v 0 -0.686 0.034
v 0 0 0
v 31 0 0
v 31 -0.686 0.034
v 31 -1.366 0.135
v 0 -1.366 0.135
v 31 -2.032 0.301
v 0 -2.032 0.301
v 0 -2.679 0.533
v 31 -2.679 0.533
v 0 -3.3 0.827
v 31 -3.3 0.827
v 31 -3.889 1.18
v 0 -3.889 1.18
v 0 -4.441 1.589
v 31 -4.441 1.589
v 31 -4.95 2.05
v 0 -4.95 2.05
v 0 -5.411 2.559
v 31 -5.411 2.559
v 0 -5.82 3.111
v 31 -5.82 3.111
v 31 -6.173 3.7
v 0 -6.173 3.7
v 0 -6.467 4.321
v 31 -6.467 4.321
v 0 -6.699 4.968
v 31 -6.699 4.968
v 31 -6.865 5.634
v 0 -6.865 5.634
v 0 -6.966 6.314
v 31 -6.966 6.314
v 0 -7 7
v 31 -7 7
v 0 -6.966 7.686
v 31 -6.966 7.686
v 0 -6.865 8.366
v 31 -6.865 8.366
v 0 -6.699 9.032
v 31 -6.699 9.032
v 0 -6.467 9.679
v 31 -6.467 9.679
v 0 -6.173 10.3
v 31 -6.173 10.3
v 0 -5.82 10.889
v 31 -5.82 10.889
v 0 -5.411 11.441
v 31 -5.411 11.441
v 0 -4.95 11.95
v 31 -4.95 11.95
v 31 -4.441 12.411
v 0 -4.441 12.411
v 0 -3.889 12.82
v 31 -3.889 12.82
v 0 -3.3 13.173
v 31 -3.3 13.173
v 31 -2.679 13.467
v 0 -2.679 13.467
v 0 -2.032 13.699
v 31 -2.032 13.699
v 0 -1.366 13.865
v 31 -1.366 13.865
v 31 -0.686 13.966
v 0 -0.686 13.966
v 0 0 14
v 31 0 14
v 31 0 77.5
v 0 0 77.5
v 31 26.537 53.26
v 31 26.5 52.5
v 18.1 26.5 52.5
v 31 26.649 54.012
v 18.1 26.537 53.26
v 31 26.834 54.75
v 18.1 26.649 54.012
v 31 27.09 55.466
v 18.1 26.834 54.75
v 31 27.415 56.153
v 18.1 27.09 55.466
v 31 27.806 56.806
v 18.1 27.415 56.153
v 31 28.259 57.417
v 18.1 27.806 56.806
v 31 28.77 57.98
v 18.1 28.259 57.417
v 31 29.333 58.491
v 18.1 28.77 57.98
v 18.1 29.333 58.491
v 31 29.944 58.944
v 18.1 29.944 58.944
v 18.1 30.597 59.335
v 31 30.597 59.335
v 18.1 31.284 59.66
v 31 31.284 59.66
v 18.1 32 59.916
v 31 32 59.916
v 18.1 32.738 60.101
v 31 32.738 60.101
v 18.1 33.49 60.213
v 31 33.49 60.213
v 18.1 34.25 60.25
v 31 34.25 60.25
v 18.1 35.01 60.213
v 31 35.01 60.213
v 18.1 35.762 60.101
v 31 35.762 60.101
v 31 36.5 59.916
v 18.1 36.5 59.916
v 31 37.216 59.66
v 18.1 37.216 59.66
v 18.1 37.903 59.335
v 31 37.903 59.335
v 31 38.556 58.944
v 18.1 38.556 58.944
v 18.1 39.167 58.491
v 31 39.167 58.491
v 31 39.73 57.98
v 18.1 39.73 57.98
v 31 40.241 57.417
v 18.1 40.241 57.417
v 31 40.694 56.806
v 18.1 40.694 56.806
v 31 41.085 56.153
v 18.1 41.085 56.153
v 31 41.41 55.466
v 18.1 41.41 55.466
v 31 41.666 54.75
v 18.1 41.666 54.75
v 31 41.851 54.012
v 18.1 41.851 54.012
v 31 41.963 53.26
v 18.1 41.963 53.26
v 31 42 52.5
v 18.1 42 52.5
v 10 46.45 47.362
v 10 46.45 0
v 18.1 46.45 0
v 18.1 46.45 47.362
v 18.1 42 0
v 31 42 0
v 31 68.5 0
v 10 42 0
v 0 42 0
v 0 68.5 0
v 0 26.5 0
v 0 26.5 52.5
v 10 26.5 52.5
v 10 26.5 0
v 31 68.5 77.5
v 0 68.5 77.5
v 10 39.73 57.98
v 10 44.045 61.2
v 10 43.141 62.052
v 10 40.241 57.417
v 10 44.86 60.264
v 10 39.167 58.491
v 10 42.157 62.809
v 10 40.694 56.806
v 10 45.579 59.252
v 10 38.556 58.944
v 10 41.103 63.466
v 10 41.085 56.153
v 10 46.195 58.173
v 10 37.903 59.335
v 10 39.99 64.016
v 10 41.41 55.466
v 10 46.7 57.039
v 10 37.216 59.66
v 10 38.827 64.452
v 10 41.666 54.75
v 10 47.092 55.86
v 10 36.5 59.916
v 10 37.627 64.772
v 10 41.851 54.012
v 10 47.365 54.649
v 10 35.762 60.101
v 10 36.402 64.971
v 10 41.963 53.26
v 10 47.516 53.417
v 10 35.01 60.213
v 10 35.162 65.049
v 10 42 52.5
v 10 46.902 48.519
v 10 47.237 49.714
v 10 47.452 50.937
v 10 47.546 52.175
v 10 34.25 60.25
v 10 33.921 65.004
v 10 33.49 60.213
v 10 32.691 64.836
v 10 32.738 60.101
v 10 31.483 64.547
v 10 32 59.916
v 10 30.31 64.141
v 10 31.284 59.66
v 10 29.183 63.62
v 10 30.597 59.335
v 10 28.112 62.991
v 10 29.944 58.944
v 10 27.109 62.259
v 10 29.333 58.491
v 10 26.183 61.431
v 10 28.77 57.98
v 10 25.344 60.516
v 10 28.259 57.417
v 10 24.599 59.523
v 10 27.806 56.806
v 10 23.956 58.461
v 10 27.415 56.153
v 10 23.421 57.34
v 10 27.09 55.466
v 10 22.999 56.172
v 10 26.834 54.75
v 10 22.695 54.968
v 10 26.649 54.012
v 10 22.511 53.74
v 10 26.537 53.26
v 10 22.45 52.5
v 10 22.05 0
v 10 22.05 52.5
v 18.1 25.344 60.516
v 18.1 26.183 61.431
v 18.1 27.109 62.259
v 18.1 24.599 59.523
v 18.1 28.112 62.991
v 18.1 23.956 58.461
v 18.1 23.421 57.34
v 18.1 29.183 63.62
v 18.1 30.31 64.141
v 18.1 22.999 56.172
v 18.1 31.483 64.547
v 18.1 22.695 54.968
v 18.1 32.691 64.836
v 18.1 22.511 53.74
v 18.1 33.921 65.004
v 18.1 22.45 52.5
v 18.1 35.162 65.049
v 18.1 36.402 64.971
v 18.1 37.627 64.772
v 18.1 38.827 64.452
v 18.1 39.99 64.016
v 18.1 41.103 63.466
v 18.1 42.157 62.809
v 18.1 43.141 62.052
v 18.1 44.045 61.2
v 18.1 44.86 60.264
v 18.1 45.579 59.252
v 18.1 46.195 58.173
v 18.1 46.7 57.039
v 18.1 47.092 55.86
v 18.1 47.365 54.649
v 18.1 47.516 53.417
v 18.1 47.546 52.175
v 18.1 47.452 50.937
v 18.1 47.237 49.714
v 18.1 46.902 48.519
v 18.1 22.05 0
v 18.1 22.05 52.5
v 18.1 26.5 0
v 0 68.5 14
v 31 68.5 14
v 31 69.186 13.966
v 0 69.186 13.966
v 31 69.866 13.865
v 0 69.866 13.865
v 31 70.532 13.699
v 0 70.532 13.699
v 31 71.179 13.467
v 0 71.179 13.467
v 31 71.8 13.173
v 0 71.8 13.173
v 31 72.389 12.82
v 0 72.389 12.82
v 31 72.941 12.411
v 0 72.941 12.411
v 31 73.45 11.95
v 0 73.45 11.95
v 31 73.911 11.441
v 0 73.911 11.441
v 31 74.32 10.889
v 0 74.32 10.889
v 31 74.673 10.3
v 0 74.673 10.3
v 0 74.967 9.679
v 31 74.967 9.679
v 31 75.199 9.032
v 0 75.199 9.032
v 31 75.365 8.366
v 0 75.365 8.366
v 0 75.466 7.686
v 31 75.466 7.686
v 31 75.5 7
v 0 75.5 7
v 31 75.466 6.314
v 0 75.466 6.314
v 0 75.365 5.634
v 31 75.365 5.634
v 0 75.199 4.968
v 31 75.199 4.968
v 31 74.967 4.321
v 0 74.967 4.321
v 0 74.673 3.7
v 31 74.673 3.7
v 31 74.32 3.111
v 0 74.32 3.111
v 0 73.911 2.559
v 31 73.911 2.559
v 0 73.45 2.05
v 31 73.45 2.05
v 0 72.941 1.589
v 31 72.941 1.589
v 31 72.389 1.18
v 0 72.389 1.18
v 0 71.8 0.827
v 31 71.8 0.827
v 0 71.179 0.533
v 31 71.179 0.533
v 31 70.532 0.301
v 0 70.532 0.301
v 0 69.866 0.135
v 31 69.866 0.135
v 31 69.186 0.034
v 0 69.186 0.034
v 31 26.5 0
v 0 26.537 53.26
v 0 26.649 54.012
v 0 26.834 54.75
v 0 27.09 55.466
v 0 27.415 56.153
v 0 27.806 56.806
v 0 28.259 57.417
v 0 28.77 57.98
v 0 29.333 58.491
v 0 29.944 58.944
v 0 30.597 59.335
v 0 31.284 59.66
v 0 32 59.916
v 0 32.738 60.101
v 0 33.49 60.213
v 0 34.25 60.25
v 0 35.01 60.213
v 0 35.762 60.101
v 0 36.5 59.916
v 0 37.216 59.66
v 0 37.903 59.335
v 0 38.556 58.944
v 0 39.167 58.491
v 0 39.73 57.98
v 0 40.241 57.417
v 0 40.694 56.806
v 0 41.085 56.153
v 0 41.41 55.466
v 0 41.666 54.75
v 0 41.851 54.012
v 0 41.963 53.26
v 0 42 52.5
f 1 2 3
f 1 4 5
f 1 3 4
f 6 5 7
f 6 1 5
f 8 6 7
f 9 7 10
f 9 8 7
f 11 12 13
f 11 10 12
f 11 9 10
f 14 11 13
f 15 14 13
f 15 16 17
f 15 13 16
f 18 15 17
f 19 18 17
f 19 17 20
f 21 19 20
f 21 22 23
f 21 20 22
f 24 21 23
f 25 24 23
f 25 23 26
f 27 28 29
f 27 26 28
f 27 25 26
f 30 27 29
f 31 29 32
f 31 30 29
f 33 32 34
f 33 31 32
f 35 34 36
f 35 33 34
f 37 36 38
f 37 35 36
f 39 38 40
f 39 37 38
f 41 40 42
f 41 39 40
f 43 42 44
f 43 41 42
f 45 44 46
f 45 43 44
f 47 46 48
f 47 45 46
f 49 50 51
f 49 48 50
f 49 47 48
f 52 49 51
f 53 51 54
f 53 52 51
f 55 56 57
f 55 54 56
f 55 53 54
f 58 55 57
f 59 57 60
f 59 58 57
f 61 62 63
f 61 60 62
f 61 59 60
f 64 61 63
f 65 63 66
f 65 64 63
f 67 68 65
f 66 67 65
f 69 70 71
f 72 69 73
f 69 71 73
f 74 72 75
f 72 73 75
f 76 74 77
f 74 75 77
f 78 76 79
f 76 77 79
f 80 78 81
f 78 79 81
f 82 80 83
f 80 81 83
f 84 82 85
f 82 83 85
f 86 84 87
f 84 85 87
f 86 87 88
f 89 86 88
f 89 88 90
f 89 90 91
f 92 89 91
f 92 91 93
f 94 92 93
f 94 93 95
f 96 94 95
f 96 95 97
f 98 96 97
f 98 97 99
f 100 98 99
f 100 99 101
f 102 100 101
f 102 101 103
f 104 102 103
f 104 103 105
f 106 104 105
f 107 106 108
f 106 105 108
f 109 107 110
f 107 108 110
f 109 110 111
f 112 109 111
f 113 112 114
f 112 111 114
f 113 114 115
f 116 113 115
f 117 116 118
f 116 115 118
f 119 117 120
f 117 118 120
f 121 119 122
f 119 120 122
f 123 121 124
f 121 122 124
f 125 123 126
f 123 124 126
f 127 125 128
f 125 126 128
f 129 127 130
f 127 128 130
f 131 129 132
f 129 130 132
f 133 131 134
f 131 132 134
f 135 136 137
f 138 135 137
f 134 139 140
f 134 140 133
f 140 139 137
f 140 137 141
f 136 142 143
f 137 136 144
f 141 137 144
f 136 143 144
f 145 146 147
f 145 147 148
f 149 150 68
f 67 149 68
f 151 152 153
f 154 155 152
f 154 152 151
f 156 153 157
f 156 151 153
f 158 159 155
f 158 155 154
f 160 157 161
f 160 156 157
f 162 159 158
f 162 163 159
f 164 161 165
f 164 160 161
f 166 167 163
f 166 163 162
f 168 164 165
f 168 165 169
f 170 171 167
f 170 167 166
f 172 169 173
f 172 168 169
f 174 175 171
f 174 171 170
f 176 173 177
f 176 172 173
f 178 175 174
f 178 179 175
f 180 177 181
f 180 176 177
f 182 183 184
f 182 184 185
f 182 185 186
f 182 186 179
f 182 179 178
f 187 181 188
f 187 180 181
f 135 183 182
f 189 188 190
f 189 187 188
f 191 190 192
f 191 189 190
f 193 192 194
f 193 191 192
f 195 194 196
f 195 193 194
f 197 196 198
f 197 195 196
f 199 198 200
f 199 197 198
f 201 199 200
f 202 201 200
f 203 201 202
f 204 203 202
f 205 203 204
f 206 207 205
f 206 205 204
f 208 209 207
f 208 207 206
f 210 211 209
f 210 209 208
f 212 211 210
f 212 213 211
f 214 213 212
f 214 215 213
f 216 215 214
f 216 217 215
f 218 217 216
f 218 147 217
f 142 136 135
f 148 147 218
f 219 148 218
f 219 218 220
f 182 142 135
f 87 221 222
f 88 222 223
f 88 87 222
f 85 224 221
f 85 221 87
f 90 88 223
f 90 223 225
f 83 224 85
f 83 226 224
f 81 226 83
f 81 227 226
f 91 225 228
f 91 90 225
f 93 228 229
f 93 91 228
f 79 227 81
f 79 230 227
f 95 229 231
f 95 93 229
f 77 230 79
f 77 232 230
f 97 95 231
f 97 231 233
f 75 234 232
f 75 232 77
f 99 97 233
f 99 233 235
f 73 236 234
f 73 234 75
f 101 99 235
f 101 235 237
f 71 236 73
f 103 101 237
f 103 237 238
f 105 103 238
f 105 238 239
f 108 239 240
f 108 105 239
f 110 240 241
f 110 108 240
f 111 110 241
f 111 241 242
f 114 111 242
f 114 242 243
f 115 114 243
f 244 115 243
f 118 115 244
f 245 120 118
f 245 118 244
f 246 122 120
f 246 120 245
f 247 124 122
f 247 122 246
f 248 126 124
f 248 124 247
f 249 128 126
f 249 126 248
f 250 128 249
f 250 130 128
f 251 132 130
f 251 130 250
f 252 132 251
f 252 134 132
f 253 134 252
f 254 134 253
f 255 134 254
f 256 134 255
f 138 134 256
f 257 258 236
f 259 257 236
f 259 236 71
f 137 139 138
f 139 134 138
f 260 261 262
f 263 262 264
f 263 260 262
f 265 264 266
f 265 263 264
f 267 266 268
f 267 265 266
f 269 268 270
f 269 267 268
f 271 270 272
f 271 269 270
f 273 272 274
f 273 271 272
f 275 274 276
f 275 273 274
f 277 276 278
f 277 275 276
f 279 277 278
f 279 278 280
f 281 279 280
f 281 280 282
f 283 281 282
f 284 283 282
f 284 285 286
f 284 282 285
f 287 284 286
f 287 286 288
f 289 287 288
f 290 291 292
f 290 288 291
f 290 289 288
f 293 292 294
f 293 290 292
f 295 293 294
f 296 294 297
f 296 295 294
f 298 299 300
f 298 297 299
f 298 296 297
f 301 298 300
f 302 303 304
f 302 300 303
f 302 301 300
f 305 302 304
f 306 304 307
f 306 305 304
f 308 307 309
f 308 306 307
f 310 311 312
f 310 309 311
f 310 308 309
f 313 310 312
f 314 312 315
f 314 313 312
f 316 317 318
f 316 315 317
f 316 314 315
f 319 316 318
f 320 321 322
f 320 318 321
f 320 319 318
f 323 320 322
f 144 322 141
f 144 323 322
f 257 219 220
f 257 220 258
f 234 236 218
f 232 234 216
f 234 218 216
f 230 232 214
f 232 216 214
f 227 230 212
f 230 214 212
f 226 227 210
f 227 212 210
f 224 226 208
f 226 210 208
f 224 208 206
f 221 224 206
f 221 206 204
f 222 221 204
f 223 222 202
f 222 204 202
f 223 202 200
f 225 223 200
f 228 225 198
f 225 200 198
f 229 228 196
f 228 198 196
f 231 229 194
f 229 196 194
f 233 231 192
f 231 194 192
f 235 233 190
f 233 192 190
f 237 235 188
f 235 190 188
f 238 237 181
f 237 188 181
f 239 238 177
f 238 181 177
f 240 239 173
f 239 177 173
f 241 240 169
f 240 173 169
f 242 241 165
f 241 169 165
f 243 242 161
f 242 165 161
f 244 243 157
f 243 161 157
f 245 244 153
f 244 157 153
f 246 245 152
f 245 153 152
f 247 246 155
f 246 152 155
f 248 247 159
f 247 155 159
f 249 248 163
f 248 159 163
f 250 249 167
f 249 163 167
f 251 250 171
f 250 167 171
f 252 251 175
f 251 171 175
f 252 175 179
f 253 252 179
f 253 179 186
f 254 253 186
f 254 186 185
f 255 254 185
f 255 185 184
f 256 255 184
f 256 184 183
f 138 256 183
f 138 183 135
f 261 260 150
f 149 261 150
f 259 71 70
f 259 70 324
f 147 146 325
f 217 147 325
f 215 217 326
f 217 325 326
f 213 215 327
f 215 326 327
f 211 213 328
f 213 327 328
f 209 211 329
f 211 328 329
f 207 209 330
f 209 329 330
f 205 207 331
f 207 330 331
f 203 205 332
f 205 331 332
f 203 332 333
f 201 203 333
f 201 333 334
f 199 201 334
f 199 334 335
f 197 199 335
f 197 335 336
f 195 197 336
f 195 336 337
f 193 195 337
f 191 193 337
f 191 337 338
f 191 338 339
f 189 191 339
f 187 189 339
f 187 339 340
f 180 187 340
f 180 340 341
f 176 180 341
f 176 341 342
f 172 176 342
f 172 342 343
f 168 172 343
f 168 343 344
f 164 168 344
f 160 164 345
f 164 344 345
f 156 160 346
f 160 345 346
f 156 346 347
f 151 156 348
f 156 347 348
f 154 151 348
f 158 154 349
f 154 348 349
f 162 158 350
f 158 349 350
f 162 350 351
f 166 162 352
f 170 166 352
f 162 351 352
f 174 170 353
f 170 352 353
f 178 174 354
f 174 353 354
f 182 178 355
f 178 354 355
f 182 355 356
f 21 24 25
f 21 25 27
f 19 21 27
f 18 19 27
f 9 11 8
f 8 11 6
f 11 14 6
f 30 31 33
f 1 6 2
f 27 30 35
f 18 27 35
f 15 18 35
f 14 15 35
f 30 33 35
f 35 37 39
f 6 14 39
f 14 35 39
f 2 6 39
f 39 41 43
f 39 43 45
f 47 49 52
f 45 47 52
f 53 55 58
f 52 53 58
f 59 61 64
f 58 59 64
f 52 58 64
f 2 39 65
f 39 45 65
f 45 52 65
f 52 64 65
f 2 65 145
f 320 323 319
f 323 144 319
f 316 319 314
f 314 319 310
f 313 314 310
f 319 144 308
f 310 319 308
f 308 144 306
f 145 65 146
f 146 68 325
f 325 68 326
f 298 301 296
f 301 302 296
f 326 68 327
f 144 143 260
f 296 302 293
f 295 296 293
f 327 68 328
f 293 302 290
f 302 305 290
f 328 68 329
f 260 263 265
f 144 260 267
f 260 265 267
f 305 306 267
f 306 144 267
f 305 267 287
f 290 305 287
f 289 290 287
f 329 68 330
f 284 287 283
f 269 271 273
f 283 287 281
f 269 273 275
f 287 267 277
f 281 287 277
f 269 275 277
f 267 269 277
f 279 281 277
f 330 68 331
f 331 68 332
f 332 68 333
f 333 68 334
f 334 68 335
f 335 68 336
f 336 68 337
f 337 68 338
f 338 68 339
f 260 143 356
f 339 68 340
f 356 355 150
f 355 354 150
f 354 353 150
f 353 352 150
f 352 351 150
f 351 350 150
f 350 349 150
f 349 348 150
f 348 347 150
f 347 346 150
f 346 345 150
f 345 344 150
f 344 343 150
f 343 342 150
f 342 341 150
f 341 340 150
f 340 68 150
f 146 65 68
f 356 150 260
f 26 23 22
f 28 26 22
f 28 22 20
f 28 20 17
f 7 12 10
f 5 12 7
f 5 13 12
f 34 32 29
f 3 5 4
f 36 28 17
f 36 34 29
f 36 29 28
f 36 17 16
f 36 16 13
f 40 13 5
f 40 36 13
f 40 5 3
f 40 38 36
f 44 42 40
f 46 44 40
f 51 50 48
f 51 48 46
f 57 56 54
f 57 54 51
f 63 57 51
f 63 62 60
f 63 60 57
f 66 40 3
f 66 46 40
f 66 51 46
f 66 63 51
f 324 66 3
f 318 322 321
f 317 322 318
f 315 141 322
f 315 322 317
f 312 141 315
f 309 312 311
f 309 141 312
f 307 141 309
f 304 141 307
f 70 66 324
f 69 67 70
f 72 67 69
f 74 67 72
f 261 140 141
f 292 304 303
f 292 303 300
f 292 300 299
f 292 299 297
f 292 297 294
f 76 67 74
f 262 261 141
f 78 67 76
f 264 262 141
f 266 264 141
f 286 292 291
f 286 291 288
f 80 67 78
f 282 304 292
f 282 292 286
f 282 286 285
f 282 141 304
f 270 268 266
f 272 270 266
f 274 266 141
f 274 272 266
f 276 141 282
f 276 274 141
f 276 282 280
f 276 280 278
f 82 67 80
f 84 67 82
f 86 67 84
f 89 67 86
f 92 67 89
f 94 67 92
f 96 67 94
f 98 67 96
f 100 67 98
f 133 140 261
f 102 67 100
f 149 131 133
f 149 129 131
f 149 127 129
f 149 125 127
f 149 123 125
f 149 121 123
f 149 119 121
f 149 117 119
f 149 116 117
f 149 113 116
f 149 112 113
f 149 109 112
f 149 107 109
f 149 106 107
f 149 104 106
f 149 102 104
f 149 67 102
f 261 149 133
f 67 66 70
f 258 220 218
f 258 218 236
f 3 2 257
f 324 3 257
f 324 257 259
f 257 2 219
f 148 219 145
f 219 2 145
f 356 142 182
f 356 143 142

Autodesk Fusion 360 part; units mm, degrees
sketch "Boceto1" plane through (0, 0, 0) normal (0, 0, 1) x (1, 0, 0)
sketch "Boceto2" plane through (0, 0, 0) normal (1, 0, 0) x (0, 1, 0)
  line L0 (0, 0) -> (68.5, 0)
  line L1 (68.5, 0) -> (68.5, 77.5)
  line L2 (68.5, 77.5) -> (0, 77.5)
  line L3 (0, 77.5) -> (0, 0)
  line L4 (0, 0) -> (26.5, 0)
  line L5 (68.5, 0) -> (42, 0)
  line L6 (0, 0) -> (0, 7)
  line L7 (68.5, 0) -> (68.5, 7)
  circle A0 centre (0, 7) radius 7
  circle A1 centre (68.5, 7) radius 7
  line L8 (68.5, 14) -> (68.5, 52.5)
  line L9 (26.5, 0) -> (42, 0)
  line L10 (42, 0) -> (42, 52.5)
  line L11 (26.5, 52.5) -> (26.5, 0)
  circle A2 centre (34.25, 52.5) radius 7.75
  line L12 (26.5, 52.5) -> (26.5, 0)
  line L13 (42, 52.5) -> (42, 0)
  line L14 (26.5, 52.5) -> (42, 52.5)
  dimension "d2" = 77.5
  dimension "d3" = 26.5
  dimension "d4" = 26.5
  dimension "d9_1" = 15.5
  dimension "d89" = 68.5
sketch "Boceto3" plane through (0, 0, 0) normal (1, 0, 0) x (0, 1, 0)
extrude "Extruir2" add sketch "Boceto2" along normal blind 31 contours L0 L1 L2 L3 L4 L5 A0 A1 L8 L10 L11 A2 L12 L13 | L3 L6 A0 | L3 L6 A0 | L1 L7 A1 | L1 L7 A1
sketch "Boceto4" plane through (0, 26.5, 0) normal (0, 1, 0) x (-1, 0, 0)
  line L0 (0, 0) -> (0, 52.5)
  line L1 (0, 52.5) -> (-31, 52.5)
  line L2 (-31, 52.5) -> (-31, 0)
  line L3 (-31, 0) -> (0, 0)
  line L4 (-31, 0) -> (-21, 0)
  line L5 (-21, 0) -> (-13, 0)
  line L6 (-13, 0) -> (0, 0)
  dimension "d14_1" = 10
  dimension "d15_1" = 8
sketch "Boceto5" plane through (0, 0, 0) normal (0, 0, -1) x (1, 0, 0)
  line L0 (0, -42) -> (0, -68.5)
  line L1 (0, -68.5) -> (31, -68.5)
  line L2 (31, -68.5) -> (31, -42)
  line L3 (31, -42) -> (0, -42)
  line L4 (31, -42) -> (31, -26.5)
  line L5 (31, -26.5) -> (31, -34.25)
  line L6 (31, -34.25) -> (0, -34.25)
  line L7 (0, -34.25) -> (0, -22.05)
  line L8 (0, -34.25) -> (0, -46.45)
  line L9 (0, -34.25) -> (31, -34.25)
  line L10 (0, -34.25) -> (0, -22.05)
  line L11 (0, -22.05) -> (31, -22.05)
  line L12 (31, -22.05) -> (31, -34.25)
  line L13 (0, -46.45) -> (31, -46.45)
  line L14 (31, -46.45) -> (31, -22.05)
  line L15 (0, -22.05) -> (10, -22.05)
  line L16 (10, -22.05) -> (18.1, -22.05)
  line L17 (10, -22.05) -> (18.1, -22.05)
  line L18 (18.1, -22.05) -> (18.1, -46.45)
  line L19 (18.1, -46.45) -> (10, -46.45)
  line L20 (10, -46.45) -> (10, -22.05)
  dimension "d16_1" = 12.2
  dimension "d17_1" = 12.2
  dimension "d18_1" = 10
  dimension "d19" = 8.1
  dimension "d20" = 8.1
extrude "Extruir3" cut sketch "Boceto5" against normal blind 52.5 contours L3 L6 L9 L18 L20 | L3 L13 L18 L19 L20 | L6 L9 L11 L16 L17 L18 L20
ref_plane "PlanoDeObra1" through (10, 44.225, 26.25) normal (1, 0, 0) x (0, 1, 0)
sketch "Boceto6" plane through (10, 44.975, 26.25) normal (1, 0, 0) x (0, 1, 0)
  circle A0 centre (-9.975, 26.25) radius 12.55
  dimension "d24_1" = 25.1
extrude "Extruir4" cut sketch "Boceto6" along normal blind 8.1
sketch "Boceto7" plane through (0, 0, 0) normal (0, 0, -1) x (1, 0, 0)
  line L0 (18.1, -22.05) -> (18.1, -26.5)
  line L1 (18.1, -26.5) -> (31, -26.5)
  line L2 (31, -26.5) -> (31, 0)
  line L3 (31, 0) -> (0, 0)
  line L4 (0, 0) -> (0, -26.5)
  line L5 (0, -26.5) -> (10, -26.5)
  line L6 (10, -26.5) -> (10, -22.05)
  line L7 (10, -22.05) -> (18.1, -22.05)
